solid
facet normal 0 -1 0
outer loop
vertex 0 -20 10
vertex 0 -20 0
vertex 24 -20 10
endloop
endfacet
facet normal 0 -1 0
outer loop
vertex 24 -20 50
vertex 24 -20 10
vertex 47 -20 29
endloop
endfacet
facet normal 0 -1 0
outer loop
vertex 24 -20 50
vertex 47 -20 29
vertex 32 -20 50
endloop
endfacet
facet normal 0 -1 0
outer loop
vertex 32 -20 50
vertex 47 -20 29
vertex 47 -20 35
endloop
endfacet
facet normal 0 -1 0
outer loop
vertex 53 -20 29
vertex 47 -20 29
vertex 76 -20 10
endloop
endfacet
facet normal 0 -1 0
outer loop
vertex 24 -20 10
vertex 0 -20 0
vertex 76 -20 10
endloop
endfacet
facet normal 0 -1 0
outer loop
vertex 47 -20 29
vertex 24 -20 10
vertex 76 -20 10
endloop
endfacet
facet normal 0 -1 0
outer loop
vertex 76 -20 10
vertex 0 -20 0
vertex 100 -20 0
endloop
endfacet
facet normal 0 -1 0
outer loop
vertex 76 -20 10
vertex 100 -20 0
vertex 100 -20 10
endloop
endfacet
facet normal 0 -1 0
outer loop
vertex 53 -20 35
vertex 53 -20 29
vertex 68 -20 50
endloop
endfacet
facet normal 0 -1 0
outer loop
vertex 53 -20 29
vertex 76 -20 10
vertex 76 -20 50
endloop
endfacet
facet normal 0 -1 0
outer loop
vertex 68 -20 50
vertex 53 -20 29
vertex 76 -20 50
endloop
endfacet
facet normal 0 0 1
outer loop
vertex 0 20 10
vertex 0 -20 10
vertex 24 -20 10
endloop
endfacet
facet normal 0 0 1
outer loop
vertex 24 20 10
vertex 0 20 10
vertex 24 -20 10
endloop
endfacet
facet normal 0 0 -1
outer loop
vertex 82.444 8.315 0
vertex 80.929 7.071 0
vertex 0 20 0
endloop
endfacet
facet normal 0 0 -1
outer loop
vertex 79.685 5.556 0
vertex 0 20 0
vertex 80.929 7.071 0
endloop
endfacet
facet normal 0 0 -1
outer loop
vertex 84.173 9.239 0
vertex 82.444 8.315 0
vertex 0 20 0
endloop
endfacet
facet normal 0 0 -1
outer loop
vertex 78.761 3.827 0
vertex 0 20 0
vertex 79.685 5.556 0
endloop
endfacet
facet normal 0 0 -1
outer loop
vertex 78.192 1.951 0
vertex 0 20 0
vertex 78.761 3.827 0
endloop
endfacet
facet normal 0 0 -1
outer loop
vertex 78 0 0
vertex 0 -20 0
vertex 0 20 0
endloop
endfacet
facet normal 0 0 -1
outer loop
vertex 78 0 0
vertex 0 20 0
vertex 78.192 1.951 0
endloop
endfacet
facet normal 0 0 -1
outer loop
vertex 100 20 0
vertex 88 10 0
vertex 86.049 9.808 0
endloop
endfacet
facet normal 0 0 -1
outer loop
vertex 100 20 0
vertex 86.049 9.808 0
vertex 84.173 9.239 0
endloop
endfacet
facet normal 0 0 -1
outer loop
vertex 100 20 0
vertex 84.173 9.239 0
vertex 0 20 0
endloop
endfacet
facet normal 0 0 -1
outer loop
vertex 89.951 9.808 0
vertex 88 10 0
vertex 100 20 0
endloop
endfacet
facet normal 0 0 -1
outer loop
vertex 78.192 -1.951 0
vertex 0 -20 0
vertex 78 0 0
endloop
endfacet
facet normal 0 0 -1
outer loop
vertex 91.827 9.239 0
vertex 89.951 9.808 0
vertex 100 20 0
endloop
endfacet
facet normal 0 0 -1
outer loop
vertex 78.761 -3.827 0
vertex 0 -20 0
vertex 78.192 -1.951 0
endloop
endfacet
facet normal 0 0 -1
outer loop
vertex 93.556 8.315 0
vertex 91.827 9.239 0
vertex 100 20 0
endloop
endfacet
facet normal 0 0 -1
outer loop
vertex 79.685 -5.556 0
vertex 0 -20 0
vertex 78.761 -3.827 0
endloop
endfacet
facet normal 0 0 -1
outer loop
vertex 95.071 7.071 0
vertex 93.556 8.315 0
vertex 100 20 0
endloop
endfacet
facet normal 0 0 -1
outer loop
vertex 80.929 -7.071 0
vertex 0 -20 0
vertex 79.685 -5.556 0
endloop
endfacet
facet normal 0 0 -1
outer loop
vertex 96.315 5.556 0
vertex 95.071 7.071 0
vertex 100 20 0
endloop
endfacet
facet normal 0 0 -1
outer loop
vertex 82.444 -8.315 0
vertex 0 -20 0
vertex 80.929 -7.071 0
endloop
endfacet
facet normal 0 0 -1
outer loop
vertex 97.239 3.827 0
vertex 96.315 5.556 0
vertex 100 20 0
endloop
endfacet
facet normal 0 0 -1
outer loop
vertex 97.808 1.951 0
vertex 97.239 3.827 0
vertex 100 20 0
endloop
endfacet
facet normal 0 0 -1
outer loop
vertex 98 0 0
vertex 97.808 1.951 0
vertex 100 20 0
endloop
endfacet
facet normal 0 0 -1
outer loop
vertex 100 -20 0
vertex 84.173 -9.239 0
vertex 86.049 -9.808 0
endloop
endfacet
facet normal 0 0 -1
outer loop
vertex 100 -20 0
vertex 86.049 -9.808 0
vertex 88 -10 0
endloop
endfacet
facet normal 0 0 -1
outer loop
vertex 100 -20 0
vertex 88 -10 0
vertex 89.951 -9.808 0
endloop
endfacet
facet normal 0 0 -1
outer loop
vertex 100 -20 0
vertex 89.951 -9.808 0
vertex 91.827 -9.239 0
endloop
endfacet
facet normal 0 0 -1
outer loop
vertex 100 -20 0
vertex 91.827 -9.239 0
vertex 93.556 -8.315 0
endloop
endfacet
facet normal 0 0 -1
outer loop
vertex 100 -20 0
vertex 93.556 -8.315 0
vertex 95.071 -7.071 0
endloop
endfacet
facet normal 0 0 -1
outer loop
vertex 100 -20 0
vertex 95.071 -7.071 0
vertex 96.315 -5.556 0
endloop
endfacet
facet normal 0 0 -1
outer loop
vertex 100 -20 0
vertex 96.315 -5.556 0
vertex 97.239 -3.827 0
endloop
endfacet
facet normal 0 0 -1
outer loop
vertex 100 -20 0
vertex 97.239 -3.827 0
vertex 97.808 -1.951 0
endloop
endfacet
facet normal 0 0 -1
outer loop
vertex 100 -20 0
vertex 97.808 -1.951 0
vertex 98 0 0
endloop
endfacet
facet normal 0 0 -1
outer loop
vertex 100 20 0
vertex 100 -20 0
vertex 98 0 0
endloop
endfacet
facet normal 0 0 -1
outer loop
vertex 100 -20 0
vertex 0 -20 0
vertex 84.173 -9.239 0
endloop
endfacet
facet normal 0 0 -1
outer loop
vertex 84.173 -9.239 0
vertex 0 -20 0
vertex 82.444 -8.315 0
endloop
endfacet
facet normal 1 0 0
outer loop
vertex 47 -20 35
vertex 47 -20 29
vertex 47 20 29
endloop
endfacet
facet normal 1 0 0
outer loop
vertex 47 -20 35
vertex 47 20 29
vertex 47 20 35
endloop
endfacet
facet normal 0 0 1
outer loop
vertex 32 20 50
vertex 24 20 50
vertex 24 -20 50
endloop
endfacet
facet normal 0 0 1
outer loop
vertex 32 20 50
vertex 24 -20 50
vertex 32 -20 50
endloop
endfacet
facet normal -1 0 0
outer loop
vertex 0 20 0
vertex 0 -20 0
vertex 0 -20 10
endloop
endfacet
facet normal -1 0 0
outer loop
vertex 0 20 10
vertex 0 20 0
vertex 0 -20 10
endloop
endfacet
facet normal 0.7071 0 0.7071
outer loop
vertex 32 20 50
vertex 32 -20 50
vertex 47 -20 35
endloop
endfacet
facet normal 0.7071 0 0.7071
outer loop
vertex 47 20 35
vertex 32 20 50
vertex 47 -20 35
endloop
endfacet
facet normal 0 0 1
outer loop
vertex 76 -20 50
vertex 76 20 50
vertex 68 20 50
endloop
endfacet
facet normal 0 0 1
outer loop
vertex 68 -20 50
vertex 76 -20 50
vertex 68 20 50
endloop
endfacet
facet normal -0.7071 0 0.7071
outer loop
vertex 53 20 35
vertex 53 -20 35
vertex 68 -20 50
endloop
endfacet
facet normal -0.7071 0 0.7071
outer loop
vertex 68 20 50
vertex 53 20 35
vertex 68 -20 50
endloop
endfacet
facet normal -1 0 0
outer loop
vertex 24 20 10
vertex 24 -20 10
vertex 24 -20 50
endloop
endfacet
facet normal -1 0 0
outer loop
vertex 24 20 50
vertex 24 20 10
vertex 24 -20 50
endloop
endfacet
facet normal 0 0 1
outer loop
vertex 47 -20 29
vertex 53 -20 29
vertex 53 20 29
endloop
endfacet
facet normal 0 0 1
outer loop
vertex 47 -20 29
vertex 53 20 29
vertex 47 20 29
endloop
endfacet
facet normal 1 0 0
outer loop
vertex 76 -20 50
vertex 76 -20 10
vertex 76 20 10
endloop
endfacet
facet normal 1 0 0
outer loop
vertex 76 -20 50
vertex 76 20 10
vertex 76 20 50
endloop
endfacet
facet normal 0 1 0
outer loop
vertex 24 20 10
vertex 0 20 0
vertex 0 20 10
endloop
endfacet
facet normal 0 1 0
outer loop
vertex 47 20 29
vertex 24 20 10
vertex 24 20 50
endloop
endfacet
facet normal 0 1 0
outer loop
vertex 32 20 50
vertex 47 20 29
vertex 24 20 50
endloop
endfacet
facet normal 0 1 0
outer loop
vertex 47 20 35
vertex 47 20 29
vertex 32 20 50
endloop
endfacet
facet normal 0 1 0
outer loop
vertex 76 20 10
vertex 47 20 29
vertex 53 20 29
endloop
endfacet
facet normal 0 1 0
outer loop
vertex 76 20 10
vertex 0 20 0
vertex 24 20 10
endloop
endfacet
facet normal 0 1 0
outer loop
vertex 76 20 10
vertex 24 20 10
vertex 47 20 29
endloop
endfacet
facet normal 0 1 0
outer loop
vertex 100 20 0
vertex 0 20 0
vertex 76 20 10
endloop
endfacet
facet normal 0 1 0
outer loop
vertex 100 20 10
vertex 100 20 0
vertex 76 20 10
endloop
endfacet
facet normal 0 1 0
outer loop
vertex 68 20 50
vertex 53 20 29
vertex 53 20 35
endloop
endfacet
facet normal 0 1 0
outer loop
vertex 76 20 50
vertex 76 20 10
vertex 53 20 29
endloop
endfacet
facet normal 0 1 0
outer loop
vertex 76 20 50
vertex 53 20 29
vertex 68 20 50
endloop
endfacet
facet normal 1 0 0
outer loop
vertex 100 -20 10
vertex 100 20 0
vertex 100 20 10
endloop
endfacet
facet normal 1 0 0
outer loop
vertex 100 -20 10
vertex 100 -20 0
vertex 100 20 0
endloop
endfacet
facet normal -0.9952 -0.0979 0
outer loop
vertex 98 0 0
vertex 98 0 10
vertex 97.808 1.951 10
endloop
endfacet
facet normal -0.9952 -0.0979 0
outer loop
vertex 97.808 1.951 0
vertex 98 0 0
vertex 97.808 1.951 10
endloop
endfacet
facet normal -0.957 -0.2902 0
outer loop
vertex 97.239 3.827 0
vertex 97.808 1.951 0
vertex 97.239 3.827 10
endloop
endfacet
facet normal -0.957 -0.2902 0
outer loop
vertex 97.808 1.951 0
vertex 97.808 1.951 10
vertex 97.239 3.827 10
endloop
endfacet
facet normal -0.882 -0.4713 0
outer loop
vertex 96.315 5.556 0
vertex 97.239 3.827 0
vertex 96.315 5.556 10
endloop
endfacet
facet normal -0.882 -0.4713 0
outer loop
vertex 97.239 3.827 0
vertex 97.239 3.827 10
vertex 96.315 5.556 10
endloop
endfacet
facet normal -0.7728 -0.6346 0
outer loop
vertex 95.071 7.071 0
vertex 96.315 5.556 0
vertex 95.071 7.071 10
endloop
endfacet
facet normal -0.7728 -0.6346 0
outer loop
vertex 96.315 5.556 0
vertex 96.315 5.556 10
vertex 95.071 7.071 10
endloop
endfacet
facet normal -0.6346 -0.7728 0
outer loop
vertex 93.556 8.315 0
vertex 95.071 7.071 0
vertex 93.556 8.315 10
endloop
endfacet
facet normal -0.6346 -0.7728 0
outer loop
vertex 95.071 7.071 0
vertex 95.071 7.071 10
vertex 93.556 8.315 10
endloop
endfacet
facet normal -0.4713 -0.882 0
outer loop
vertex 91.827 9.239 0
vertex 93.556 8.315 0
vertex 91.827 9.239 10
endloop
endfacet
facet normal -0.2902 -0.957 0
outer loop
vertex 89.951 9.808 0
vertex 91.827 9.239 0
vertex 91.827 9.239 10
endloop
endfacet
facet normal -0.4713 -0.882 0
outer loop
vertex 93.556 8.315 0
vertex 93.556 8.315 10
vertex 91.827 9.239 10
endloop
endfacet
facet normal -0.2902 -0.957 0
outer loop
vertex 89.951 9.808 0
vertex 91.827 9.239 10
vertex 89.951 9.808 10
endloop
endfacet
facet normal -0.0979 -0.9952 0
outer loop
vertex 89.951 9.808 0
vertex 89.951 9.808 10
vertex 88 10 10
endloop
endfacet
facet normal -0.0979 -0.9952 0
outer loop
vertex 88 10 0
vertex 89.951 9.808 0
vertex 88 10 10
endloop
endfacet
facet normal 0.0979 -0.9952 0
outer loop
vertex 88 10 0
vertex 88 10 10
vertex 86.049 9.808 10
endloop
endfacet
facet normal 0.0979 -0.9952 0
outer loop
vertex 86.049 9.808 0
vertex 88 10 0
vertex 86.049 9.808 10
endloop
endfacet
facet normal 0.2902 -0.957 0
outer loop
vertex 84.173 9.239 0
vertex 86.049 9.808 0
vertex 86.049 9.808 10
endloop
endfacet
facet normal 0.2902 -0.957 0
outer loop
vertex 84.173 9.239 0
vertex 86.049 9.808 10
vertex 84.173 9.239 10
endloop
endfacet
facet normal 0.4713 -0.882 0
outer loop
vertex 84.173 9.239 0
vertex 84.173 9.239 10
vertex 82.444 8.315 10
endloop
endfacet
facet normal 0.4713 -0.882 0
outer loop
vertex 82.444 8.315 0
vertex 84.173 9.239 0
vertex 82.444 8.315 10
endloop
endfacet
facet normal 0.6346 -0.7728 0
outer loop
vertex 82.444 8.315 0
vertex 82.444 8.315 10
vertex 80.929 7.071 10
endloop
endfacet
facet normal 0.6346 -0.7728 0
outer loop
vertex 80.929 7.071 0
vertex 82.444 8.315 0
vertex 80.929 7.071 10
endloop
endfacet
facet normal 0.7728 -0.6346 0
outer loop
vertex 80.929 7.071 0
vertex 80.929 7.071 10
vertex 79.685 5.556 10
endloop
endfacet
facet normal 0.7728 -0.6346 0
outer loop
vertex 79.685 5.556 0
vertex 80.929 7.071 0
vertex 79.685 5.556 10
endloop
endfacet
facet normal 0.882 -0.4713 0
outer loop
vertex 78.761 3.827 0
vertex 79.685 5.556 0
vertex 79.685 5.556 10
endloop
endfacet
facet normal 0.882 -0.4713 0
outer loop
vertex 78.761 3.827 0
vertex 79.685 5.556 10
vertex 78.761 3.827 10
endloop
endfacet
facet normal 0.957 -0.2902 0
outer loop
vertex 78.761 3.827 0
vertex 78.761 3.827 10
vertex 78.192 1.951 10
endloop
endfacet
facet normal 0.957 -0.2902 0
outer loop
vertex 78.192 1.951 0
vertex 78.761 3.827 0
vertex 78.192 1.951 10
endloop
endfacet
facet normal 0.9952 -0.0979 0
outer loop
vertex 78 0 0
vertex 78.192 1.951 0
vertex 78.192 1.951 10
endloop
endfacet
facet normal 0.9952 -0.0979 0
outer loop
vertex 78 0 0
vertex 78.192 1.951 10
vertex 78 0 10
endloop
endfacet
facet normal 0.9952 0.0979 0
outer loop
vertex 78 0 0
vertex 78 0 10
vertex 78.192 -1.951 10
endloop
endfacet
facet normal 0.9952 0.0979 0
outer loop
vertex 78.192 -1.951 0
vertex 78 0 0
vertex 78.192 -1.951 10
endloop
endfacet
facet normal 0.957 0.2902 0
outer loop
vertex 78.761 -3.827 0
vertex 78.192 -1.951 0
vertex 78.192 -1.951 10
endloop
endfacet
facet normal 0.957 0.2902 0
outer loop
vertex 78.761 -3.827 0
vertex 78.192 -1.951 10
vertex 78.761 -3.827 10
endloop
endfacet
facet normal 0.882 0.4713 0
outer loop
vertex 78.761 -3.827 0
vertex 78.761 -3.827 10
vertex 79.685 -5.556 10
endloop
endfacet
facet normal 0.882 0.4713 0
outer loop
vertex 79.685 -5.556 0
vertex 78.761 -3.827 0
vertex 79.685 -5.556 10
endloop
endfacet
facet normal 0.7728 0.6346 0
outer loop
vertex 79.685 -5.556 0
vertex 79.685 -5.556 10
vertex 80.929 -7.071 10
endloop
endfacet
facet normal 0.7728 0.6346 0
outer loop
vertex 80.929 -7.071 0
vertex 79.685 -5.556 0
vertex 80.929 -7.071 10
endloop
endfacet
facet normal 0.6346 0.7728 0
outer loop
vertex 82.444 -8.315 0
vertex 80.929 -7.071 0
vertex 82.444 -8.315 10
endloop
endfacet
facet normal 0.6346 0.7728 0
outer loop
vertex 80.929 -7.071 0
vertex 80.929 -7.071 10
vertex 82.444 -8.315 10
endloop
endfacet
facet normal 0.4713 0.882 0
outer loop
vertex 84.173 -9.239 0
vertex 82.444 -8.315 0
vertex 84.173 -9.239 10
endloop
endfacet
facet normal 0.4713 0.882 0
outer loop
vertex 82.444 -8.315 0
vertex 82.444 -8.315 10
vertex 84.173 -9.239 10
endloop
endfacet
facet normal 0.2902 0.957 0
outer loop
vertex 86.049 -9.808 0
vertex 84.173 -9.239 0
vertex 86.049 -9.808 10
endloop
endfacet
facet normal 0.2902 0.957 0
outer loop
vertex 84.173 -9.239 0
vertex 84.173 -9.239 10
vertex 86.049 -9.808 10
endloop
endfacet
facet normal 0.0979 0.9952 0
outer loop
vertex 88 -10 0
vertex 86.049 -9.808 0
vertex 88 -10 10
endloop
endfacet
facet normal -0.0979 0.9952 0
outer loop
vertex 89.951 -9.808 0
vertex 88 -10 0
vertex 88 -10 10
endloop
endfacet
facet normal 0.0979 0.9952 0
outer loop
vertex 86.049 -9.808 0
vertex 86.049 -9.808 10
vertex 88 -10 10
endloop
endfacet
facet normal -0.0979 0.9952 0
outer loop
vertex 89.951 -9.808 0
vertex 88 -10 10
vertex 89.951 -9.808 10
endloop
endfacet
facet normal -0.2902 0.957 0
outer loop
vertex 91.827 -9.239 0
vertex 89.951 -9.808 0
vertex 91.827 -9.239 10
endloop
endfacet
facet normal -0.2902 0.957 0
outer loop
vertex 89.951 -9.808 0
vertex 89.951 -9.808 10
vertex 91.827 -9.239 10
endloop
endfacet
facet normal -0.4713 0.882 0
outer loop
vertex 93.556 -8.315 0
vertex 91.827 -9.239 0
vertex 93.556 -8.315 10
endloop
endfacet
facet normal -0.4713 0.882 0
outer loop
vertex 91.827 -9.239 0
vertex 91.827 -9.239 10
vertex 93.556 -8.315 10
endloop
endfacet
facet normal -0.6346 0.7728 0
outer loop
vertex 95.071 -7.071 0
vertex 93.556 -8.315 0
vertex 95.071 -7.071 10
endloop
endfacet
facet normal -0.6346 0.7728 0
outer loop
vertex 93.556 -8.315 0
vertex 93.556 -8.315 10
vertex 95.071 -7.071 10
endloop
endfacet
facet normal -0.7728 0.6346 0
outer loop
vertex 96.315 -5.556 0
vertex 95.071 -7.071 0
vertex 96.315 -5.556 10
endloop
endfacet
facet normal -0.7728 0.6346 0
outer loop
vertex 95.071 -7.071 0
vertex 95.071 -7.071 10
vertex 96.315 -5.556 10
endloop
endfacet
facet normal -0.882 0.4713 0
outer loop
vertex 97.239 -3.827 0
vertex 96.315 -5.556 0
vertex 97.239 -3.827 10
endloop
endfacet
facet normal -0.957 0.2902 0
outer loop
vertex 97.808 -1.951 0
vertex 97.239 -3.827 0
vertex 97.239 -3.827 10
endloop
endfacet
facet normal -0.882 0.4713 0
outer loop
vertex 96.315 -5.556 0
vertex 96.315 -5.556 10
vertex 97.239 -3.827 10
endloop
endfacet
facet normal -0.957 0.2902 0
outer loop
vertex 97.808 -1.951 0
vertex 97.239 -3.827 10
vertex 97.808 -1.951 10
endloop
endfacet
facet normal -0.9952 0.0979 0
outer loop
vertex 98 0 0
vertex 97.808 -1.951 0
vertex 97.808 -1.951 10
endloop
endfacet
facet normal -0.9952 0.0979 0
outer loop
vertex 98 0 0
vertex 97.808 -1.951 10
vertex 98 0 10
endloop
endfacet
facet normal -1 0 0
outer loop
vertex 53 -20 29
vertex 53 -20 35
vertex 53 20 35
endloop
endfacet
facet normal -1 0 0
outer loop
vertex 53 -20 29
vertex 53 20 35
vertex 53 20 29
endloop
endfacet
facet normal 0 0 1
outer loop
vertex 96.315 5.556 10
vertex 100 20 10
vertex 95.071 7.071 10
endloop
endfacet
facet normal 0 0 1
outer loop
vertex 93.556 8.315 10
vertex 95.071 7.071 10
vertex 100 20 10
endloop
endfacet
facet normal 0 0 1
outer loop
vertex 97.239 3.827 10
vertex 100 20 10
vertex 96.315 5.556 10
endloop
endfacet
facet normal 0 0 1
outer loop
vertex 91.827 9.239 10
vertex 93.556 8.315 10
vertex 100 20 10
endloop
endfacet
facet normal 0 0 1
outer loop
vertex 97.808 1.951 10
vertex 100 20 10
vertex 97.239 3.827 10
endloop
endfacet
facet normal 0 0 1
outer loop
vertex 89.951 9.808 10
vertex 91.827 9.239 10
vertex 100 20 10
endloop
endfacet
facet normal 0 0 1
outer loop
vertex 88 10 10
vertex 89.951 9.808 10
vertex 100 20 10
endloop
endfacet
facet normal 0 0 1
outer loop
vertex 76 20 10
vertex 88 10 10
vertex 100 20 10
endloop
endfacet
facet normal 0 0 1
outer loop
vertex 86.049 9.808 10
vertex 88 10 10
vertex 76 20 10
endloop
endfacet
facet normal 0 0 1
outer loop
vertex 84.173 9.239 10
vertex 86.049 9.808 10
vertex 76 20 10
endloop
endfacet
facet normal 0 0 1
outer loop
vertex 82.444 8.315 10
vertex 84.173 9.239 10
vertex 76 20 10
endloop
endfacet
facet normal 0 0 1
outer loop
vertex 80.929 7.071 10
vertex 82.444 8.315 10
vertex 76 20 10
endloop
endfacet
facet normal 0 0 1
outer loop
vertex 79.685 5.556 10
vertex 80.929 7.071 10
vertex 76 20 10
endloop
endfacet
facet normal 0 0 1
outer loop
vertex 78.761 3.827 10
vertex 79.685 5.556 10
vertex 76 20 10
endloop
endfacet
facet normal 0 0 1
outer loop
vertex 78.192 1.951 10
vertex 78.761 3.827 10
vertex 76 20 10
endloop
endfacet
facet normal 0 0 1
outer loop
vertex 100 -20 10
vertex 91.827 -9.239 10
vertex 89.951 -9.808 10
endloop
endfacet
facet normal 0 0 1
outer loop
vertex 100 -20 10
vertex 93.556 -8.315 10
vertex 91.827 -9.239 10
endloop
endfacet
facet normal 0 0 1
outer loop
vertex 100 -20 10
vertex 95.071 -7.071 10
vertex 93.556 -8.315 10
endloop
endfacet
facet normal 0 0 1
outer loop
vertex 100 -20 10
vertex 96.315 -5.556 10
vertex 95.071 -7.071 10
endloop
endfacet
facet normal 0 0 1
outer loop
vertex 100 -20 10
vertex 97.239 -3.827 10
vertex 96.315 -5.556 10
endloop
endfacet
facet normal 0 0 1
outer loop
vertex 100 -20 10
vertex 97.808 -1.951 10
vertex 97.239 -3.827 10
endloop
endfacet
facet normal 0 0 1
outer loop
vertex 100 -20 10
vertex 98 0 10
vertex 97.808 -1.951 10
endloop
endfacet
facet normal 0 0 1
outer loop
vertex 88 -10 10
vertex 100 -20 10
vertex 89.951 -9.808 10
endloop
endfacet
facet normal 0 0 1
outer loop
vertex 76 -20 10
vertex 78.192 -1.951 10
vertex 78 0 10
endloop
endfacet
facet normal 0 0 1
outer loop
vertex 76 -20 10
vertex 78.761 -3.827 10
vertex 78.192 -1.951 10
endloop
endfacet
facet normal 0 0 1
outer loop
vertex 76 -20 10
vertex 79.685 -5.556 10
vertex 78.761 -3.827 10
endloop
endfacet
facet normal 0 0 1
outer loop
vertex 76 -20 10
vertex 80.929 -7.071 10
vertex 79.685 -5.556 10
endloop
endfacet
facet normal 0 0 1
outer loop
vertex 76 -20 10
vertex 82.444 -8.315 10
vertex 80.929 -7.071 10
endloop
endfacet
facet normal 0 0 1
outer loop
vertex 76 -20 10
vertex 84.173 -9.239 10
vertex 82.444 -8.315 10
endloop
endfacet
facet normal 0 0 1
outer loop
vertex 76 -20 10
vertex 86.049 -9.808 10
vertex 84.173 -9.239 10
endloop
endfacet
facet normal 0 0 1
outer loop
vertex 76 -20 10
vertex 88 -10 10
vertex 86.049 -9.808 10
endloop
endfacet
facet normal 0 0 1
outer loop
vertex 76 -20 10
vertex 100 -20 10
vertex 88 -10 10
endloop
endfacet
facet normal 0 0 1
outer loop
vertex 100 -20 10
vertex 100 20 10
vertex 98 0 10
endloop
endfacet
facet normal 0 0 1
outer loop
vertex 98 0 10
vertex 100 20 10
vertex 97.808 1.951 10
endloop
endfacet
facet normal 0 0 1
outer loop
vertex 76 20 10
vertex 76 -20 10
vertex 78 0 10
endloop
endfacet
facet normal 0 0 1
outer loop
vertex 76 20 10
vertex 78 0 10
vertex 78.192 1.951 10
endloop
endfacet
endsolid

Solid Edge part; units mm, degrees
sketch "Sketch1" plane through (0, 0, 0) normal (0, -1, 0) x (1, 0, 0)
  line L0 (32, 50) -> (47, 35)
  line L1 (47, 29) -> (47, 35)
  line L2 (53, 29) -> (47, 29)
  line L3 (53, 35) -> (53, 29)
  line L4 (53, 35) -> (68, 50)
  line L5 (76, 50) -> (68, 50)
  line L6 (76, 10) -> (76, 50)
  line L7 (100, 10) -> (76, 10)
  line L8 (100, 0) -> (100, 10)
  line L9 (0, 0) -> (100, 0)
  line L10 (0, 0) -> (0, 10)
  line L11 (0, 10) -> (24, 10)
  line L12 (24, 10) -> (24, 50)
  line L13 (24, 50) -> (32, 50)
extrude "ExtrudedProtrusion_1" add sketch "Sketch1" against normal blind 20 and the other way blind 20
sketch "Sketch2" plane through (88, 0, 10) normal (0, 0, 1) x (1, 0, 0)
  circle A0 centre (0, 0) radius 10
extrude "ExtrudedCutout_1" cut sketch "Sketch2" against normal blind 10
